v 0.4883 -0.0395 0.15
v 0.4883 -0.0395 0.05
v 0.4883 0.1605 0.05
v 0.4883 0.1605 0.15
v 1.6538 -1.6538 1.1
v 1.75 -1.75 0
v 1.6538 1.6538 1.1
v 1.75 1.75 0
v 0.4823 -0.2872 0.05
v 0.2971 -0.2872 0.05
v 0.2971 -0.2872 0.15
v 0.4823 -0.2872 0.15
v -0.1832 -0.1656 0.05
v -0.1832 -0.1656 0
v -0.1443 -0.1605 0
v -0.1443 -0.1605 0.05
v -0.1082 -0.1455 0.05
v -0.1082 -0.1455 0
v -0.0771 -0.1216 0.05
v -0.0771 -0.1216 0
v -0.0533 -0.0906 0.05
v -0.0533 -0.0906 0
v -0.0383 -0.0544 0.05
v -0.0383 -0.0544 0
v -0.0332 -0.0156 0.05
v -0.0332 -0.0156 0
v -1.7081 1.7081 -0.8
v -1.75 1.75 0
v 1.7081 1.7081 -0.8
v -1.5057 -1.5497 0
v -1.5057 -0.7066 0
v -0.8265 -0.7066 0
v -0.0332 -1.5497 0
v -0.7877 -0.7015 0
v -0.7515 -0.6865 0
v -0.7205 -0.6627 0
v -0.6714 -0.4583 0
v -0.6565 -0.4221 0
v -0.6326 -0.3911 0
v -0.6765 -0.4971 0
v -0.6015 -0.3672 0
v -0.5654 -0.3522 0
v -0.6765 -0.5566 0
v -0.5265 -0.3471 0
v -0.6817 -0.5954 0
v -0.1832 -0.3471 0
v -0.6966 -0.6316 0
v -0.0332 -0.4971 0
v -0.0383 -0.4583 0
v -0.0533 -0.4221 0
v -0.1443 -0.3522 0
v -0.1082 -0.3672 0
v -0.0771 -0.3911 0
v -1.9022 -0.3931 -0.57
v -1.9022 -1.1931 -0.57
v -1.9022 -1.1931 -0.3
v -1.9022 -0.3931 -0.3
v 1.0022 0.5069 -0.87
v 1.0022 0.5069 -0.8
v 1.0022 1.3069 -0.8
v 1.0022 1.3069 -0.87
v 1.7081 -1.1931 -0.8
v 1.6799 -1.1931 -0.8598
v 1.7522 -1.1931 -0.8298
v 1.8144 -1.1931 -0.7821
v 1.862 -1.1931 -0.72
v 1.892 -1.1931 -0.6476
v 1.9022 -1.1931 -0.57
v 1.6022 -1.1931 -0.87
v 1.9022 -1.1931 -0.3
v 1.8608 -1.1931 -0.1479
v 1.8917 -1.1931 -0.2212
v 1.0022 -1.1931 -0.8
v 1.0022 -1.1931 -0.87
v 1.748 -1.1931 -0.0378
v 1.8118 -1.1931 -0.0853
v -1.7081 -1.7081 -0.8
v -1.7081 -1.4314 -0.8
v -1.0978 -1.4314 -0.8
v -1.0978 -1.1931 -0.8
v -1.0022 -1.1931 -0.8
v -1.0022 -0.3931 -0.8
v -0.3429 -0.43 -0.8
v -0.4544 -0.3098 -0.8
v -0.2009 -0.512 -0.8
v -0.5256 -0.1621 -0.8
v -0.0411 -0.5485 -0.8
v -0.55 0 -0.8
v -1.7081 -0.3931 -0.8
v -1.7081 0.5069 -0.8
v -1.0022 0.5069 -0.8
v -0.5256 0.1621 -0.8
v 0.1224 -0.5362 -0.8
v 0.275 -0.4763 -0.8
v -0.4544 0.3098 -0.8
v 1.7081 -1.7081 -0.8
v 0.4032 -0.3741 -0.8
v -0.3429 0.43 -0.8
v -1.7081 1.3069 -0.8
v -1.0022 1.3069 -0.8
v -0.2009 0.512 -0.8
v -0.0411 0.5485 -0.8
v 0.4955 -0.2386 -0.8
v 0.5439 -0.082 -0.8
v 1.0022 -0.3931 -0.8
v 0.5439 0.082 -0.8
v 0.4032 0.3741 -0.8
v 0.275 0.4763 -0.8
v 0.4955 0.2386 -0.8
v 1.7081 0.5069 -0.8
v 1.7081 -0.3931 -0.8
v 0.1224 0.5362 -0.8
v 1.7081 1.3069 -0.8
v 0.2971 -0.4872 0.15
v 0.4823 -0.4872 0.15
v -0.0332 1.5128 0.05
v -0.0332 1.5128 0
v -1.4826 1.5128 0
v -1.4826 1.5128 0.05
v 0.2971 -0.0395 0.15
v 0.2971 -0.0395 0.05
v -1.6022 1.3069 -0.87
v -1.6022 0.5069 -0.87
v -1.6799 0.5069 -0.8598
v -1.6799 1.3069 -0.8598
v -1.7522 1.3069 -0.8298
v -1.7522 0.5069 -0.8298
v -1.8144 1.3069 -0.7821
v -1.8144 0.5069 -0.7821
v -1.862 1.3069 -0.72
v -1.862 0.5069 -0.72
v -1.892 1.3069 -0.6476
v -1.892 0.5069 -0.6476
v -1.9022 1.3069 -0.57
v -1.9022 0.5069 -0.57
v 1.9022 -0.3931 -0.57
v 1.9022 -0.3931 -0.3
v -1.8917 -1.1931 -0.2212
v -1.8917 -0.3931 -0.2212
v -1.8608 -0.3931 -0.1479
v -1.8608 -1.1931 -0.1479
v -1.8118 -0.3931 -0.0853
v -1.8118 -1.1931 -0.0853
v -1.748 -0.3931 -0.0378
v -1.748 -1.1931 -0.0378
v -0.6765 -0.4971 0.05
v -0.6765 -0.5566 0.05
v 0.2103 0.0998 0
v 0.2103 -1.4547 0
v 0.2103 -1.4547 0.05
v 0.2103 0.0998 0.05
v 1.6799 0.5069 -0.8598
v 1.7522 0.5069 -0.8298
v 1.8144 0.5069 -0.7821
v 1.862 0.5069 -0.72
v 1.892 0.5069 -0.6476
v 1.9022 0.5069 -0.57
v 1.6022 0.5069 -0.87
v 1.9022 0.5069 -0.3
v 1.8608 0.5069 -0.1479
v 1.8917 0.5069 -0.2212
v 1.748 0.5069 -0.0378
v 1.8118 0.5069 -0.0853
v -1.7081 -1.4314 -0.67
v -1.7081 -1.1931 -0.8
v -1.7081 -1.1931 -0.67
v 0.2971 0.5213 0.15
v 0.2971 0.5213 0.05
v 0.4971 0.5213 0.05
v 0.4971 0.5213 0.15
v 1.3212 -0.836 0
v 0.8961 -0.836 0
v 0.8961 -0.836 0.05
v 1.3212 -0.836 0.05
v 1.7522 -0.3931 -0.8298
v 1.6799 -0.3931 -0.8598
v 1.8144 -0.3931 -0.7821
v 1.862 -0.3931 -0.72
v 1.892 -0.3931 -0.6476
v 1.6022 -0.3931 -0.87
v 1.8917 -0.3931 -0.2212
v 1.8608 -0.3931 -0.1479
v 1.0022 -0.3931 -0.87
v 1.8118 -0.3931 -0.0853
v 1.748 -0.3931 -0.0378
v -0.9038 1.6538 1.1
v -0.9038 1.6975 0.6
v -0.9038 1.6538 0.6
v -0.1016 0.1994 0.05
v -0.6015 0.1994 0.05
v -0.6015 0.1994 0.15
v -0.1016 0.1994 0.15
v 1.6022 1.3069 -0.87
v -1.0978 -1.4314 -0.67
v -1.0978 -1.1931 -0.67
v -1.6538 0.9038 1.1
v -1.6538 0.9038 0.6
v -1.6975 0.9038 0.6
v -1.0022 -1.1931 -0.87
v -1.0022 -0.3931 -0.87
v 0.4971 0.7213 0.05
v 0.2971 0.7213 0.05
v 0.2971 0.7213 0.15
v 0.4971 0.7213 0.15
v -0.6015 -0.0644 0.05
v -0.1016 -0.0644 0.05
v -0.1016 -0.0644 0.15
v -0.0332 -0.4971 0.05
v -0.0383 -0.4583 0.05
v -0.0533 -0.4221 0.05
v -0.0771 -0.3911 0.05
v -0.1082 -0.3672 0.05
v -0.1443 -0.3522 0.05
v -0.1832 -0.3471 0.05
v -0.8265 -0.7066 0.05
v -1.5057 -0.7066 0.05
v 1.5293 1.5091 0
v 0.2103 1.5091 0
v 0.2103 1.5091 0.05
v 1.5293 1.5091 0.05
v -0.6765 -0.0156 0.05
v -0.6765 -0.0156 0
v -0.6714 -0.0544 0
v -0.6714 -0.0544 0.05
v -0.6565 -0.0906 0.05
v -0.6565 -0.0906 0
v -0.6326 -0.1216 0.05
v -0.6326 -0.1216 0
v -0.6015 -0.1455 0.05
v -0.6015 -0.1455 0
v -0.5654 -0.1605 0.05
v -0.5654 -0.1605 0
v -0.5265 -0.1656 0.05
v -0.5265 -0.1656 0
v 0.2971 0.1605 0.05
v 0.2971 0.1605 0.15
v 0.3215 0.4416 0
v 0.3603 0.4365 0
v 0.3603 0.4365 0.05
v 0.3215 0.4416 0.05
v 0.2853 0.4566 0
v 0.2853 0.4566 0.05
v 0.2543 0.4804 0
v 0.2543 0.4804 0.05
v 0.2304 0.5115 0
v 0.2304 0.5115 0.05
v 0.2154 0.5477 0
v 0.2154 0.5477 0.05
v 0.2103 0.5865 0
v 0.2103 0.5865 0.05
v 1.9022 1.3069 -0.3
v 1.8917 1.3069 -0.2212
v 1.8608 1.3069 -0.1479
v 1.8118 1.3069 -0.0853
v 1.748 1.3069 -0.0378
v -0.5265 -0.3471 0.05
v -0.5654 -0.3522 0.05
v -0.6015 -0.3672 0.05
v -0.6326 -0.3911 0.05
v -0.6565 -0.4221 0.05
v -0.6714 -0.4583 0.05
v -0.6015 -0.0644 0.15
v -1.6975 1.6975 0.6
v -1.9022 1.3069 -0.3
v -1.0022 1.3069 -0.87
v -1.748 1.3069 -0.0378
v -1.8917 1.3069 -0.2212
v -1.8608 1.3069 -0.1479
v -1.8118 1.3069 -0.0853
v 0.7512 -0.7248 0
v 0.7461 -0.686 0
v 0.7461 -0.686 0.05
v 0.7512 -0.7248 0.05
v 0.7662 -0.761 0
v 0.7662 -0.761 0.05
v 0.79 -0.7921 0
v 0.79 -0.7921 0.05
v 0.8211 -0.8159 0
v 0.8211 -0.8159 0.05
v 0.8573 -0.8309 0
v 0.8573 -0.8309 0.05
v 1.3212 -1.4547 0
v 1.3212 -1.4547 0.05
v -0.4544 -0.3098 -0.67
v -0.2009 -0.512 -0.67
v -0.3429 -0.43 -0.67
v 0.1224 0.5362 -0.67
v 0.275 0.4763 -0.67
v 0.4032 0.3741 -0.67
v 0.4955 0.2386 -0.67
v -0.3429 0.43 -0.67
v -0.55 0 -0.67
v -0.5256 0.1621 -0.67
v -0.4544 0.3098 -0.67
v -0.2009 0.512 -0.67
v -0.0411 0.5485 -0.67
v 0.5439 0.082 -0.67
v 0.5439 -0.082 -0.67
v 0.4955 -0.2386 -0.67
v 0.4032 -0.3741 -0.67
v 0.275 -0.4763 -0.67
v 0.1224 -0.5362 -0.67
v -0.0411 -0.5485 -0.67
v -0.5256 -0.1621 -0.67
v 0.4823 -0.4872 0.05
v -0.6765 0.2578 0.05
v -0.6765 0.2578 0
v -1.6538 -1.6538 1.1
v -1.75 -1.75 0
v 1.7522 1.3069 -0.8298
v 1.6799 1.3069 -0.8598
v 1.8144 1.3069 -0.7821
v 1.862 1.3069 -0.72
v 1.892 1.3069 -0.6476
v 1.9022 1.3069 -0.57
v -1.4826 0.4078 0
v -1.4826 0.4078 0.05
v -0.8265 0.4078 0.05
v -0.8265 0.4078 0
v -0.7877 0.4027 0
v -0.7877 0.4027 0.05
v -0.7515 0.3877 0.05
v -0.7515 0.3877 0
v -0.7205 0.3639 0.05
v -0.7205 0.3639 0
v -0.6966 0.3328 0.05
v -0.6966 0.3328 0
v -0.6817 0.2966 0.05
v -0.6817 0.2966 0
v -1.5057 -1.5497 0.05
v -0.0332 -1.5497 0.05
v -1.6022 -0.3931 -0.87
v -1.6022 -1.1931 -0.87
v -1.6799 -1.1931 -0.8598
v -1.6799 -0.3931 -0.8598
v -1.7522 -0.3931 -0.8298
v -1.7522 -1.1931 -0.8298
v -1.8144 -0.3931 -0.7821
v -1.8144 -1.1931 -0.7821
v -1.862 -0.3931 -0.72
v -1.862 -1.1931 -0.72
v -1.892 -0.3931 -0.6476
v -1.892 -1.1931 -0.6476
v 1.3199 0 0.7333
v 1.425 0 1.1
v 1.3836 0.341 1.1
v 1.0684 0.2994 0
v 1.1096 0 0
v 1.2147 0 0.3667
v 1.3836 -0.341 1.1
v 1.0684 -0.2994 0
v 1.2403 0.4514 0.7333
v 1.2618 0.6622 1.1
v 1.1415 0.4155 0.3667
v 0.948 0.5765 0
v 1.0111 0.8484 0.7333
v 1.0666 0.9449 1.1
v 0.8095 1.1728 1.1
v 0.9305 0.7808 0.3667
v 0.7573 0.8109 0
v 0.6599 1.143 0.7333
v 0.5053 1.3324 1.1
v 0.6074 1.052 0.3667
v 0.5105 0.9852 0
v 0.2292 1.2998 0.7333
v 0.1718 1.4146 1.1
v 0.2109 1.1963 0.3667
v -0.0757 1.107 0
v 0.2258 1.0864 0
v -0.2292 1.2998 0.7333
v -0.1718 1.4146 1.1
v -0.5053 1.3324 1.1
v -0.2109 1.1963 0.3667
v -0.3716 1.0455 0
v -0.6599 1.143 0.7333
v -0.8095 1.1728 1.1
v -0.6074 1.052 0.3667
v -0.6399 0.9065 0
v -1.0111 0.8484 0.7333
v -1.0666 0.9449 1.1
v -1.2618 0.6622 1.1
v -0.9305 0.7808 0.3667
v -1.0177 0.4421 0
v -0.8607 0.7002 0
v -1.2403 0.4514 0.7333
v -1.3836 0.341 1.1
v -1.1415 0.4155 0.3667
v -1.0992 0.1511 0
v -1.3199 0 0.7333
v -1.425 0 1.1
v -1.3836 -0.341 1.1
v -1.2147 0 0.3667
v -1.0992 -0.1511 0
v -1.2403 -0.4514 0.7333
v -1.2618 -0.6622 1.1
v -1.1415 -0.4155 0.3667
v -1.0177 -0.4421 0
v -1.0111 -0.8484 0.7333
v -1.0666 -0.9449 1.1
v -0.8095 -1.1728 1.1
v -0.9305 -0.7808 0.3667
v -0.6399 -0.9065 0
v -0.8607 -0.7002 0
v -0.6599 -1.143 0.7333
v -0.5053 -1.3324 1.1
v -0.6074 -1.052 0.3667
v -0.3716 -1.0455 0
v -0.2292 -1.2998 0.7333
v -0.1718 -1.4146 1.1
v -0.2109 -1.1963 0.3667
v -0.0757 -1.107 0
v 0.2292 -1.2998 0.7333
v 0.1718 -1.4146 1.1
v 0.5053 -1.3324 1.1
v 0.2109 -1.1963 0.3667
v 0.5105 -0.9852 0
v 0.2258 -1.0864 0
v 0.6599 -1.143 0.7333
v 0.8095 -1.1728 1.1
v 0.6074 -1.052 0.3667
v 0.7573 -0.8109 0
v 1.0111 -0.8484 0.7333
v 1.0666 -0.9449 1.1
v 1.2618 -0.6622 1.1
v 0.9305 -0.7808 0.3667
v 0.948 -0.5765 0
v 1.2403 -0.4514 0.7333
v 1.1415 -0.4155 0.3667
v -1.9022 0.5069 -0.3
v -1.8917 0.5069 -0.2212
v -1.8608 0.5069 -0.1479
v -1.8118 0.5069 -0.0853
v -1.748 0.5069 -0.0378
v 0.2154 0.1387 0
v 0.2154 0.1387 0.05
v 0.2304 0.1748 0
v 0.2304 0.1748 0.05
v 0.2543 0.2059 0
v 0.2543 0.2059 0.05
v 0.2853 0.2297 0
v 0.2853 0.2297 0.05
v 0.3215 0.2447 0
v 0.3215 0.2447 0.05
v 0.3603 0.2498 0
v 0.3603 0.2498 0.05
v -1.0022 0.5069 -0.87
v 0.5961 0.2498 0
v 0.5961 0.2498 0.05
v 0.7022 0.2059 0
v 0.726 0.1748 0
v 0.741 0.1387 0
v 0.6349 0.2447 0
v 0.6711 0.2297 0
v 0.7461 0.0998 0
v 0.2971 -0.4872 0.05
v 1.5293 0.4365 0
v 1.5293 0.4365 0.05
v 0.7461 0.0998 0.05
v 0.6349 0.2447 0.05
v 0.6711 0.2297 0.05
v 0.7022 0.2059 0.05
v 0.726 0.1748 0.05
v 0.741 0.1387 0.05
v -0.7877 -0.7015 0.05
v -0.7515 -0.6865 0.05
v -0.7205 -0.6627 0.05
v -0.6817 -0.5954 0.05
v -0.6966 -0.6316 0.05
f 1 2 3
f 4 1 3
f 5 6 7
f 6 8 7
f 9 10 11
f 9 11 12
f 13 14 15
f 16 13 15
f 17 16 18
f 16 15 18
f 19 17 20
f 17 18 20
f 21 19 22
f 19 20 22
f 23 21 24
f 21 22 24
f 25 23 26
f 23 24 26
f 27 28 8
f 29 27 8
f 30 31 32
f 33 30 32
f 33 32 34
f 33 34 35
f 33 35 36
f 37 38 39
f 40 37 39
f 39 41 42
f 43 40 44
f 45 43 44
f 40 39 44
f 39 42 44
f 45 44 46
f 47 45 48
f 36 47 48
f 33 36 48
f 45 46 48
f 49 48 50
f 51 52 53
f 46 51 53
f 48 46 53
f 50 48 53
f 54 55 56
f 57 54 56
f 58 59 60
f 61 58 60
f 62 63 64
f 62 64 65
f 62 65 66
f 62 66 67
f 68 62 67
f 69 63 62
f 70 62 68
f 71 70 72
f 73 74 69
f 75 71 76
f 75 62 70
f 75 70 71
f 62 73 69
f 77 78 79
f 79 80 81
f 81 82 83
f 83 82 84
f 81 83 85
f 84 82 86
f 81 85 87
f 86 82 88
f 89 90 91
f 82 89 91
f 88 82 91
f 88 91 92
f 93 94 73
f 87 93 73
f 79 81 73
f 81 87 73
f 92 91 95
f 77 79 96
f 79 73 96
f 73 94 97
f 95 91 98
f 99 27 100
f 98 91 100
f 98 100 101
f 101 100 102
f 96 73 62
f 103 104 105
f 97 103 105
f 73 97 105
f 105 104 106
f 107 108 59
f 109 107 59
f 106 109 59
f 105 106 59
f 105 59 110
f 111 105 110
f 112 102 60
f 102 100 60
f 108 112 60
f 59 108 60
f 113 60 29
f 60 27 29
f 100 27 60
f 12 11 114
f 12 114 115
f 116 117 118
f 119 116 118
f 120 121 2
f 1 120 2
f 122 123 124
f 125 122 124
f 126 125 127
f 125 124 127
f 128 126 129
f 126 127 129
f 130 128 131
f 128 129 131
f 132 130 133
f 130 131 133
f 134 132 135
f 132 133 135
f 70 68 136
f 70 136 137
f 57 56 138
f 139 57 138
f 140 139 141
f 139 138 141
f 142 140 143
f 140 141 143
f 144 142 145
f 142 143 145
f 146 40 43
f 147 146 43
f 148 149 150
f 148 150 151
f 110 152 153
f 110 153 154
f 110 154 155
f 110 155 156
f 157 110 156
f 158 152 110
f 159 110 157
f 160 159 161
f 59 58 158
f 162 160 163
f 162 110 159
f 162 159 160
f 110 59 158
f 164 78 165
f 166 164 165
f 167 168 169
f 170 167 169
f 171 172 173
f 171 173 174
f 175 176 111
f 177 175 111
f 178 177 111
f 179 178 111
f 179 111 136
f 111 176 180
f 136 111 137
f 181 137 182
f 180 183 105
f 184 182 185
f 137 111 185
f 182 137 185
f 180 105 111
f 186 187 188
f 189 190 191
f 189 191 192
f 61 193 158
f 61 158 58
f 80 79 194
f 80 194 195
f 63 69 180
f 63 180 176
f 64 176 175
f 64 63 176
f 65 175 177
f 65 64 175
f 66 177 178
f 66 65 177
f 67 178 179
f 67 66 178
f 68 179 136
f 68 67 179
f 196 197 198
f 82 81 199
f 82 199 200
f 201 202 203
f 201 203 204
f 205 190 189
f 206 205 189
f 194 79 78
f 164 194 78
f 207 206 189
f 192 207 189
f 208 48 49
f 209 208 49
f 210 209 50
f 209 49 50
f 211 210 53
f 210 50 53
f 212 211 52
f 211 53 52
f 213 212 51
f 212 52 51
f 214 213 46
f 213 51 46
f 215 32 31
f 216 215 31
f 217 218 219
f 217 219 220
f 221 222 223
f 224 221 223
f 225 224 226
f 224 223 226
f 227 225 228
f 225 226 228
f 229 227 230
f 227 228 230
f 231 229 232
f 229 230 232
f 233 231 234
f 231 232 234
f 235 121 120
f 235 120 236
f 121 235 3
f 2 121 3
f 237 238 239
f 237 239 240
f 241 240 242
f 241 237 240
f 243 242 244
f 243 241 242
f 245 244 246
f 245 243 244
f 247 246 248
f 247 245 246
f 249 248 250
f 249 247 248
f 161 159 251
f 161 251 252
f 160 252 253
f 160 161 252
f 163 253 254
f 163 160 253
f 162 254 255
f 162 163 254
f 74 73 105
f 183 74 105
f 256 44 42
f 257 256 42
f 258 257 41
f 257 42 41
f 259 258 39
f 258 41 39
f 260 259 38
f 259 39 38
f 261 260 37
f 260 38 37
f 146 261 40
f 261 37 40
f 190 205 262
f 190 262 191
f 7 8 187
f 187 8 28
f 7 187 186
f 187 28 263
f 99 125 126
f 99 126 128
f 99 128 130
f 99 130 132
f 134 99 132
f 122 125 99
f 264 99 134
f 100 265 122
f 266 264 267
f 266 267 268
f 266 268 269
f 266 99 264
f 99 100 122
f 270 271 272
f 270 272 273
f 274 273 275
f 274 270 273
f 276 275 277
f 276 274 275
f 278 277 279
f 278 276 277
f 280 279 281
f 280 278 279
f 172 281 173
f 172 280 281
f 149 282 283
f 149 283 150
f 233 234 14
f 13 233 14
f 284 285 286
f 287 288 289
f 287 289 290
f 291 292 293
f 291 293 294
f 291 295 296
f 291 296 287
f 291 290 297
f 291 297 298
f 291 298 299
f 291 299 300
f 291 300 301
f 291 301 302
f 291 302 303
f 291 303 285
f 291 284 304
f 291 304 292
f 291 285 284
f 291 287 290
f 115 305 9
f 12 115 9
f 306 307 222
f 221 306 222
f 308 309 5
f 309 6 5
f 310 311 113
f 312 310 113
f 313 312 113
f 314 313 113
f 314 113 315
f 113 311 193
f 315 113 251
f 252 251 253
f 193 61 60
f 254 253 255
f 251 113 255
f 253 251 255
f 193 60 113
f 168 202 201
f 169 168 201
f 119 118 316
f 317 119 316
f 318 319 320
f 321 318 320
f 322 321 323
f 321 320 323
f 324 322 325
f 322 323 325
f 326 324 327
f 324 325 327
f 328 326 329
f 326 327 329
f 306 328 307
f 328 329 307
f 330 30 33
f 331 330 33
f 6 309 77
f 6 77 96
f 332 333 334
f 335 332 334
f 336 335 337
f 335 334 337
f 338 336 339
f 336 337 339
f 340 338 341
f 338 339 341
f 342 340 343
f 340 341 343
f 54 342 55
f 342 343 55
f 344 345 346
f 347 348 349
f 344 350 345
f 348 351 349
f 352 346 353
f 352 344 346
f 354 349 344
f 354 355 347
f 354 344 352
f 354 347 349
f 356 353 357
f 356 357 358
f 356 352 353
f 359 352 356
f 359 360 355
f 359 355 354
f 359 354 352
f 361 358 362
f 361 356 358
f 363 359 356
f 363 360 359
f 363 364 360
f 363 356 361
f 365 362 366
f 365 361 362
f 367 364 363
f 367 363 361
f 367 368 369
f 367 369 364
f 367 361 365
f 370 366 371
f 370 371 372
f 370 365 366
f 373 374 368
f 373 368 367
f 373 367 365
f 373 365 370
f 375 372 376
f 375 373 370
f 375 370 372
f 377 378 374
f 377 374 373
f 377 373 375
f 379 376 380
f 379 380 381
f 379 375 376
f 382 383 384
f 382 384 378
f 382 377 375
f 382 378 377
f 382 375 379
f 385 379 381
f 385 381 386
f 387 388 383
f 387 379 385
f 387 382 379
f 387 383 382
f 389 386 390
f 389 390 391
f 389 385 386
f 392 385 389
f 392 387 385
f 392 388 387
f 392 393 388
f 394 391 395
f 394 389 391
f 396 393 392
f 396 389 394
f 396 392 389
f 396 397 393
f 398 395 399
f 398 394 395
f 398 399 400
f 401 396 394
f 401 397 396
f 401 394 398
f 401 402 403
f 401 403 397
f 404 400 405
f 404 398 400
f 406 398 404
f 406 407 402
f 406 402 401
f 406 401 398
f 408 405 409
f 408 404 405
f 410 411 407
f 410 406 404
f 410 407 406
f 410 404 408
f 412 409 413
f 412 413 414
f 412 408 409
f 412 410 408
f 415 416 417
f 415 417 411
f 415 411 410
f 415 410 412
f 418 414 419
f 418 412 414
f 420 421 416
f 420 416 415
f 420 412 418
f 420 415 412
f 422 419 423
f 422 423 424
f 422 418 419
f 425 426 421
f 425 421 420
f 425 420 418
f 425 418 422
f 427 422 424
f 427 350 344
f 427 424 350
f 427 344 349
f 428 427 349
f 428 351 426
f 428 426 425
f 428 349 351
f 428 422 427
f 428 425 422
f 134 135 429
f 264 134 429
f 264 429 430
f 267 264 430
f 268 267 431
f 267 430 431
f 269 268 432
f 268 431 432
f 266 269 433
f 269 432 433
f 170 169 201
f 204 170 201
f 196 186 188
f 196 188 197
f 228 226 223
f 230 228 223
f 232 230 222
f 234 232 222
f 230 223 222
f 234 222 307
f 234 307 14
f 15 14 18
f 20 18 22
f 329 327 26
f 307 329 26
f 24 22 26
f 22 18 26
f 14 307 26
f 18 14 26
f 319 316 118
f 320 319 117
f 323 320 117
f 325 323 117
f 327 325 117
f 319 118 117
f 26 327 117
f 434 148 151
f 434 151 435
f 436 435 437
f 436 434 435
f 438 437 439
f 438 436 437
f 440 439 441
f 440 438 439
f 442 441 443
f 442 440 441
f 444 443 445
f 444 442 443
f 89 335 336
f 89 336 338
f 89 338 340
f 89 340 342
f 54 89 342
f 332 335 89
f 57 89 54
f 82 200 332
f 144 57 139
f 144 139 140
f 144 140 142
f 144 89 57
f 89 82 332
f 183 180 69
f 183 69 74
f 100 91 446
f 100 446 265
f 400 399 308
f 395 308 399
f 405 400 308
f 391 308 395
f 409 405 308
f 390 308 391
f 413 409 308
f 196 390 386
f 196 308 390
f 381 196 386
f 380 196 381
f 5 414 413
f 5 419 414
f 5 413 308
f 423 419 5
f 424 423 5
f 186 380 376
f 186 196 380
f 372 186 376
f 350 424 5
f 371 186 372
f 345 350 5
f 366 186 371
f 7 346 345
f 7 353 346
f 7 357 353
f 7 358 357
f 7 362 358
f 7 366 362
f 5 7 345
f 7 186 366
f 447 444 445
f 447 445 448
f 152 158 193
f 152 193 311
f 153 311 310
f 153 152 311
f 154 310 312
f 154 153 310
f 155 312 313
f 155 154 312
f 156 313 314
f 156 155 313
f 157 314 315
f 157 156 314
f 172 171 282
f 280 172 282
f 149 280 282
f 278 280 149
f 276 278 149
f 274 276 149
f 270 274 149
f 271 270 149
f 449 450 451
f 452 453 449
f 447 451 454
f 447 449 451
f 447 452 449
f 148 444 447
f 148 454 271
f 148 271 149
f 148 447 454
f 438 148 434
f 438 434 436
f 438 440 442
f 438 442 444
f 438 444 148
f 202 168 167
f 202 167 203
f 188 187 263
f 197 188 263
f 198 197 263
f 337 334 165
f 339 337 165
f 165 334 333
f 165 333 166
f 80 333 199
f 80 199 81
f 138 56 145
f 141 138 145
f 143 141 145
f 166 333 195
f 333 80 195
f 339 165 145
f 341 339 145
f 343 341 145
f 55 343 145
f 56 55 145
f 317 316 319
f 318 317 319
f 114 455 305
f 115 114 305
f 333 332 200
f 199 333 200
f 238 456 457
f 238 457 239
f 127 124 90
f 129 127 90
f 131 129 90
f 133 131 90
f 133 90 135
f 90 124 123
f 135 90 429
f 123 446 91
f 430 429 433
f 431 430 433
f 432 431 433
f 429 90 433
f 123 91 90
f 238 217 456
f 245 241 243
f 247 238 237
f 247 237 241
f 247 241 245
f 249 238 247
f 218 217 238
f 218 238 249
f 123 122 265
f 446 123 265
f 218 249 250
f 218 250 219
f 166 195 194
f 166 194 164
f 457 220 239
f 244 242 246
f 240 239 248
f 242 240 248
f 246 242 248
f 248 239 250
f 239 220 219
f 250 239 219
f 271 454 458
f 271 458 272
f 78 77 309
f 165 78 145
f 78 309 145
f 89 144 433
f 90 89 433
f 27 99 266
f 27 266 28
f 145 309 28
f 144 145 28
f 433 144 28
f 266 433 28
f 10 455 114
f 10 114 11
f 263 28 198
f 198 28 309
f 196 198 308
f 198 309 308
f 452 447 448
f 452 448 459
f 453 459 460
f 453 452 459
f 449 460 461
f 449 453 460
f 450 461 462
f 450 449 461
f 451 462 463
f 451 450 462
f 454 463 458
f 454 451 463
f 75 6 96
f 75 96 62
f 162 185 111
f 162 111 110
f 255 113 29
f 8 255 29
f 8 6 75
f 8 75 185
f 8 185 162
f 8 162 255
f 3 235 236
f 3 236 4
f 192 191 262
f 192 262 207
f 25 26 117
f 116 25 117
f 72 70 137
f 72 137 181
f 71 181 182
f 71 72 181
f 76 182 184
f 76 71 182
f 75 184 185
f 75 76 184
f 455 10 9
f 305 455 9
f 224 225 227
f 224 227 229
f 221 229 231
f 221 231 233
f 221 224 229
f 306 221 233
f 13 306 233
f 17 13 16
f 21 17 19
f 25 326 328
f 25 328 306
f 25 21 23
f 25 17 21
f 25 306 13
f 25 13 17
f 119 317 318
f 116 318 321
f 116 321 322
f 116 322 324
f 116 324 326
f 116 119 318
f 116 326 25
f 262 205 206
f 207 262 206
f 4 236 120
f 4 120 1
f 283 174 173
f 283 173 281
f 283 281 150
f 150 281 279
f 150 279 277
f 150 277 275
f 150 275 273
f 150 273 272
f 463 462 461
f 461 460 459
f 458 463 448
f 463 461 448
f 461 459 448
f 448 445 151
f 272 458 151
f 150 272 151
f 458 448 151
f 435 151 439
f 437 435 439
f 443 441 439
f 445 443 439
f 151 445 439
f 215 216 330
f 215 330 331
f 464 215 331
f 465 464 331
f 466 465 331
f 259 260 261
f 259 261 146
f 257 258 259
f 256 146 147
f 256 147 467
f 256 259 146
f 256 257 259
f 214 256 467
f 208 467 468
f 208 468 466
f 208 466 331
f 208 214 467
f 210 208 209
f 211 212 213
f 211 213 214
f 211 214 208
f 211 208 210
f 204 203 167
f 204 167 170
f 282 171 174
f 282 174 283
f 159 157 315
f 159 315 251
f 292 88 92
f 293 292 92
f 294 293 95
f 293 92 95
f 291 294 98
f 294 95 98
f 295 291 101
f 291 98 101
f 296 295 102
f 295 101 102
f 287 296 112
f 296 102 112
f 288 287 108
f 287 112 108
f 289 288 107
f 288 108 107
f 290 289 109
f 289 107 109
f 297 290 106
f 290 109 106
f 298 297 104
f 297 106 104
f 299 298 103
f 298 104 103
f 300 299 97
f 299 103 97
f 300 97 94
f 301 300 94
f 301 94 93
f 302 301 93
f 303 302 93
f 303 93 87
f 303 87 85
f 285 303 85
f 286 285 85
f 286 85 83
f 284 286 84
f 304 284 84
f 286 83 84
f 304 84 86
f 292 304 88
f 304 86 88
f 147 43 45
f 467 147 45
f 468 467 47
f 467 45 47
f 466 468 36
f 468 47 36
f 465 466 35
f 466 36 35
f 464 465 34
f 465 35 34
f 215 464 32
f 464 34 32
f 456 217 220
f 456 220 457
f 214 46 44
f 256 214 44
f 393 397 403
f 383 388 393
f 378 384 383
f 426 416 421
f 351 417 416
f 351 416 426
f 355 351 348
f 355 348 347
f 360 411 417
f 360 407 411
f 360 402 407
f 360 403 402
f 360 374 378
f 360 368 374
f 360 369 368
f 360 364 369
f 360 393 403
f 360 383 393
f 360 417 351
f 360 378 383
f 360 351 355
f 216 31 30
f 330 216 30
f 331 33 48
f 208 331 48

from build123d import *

# Parameters (mm, degrees)
SKETCH_1_W                       = 3.5
SKETCH_1_H                       = 3.5
EXTRUDE_1_DEPTH                  = 0.8
EXTRUDE_1_DRAFT                  = -3
SKETCH_3_R                       = 0.55
SKETCH_3_W                       = 0.705840171
SKETCH_3_H                       = 0.8
SKETCH_3_W_2                     = 0.610307383
CUT_EXTRUDE_1_DEPTH              = 0.13
SKETCH_5_W                       = 0.7
SKETCH_5_H                       = 0.8
SM_BASE_FLANGE_1_DEPTH           = 0.2
SM_EDGE_FLANGE_1_STRIP_W         = 1
SM_EDGE_FLANGE_1_STRIP_H         = 0.2
SM_EDGE_FLANGE_1_STRIP_CUT_DEPTH = 0.8
SM_EDGE_FLANGE_1_DEPTH           = 0.8
SM_EDGE_FLANGE_2_STRIP_W         = 1
SM_EDGE_FLANGE_2_STRIP_H         = 0.2
SM_EDGE_FLANGE_2_STRIP_CUT_DEPTH = 0.8
SM_EDGE_FLANGE_2_DEPTH           = 0.8
PATTERN_LINEAR_1_COUNT           = 2
PATTERN_LINEAR_1_PITCH           = 1.7
SKETCH_30_W                      = 3.5
SKETCH_30_H                      = 3.5
EXTRUDE_3_DEPTH                  = 1.1
EXTRUDE_3_TAPER                  = 5
CUT_EXTRUDE_2_DEPTH              = 0.5
SKETCH_34_R                      = 1.1
CUT_EXTRUDE_3_DEPTH              = 1.1
CHAMFER_1_SIZE                   = 0.325
CHAMFER_1_SIZE_2                 = 1.133409694
EXTRUDE_4_DEPTH                  = 0.05
EXTRUDE_4_2_DEPTH                = 0.05
EXTRUDE_4_3_DEPTH                = 0.05
EXTRUDE_4_4_DEPTH                = 0.05
SKETCH_49_W                      = 0.499821424
SKETCH_49_H                      = 0.263797991
EXTRUDE_5_DEPTH                  = 0.1
SKETCH_49_W_2                    = 0.2
SKETCH_49_H_2                    = 0.2
EXTRUDE_5_2_DEPTH                = 0.1
SKETCH_49_W_3                    = 0.191122393
EXTRUDE_5_3_DEPTH                = 0.1
SKETCH_49_W_4                    = 0.185203988
EXTRUDE_5_4_DEPTH                = 0.1


# Sheet-metal steps are written as plain solids
with BuildPart() as part:
    # Sketch 1 → Бобышка-Вытянуть1 (with draft: the straight prism first)
    with BuildSketch(Plane.XY):
        Rectangle(SKETCH_1_W, SKETCH_1_H)
    extrude(amount=-EXTRUDE_1_DEPTH)
    # Бобышка-Вытянуть1: the draft: its side faces are tilted about the plane it starts from
    extrude_1_sides = [part.faces().sort_by_distance(p)[0] for p in [
        (-1.75, 0, -0.4),
        (0, -1.75, -0.4),
        (1.75, 0, -0.4),
        (0, 1.75, -0.4),
    ]]
    draft(extrude_1_sides, Plane.XY, EXTRUDE_1_DRAFT)

    # Sketch 3 → Вырез-Вытянуть1 (cut)
    with BuildSketch(Plane(origin=(0, 0, -0.8), x_dir=(-1, 0, 0), z_dir=(0, 0, -1))):
        Circle(SKETCH_3_R)
        with Locations((-1.355153691, 0.906864755)):
            Rectangle(SKETCH_3_W, SKETCH_3_H)
        with Locations((1.402920085, 0.906864755)):
            Rectangle(SKETCH_3_W_2, SKETCH_3_H)
        with Locations((-1.355153691, -0.793135245)):
            Rectangle(SKETCH_3_W, SKETCH_3_H)
        with Locations((1.402920085, -1.031434947)):
            Rectangle(SKETCH_3_W_2, SKETCH_3_H)
    extrude(amount=-CUT_EXTRUDE_1_DEPTH, mode=Mode.SUBTRACT)



with BuildPart() as body_2:
    # Sketch 5 → Базовая кромка1 (new body)
    with BuildSketch(Plane(origin=(0, 0, -0.67), x_dir=(-1, 0, 0), z_dir=(0, 0, -1))):
        with Locations((-1.352233606, 0.906864755)):
            Rectangle(SKETCH_5_W, SKETCH_5_H)
    extrude(amount=SM_BASE_FLANGE_1_DEPTH)

    # Ребро-кромка1 strip (across the edge) → Ребро-кромка1 strip cut (cut)
    with BuildSketch(Plane(origin=(1.702233606, 0.506864755, -0.67), x_dir=(-1, 0, 0), z_dir=(0, 1, 0))):
        with Locations((-0.4, -0.1)):
            Rectangle(SM_EDGE_FLANGE_1_STRIP_W, SM_EDGE_FLANGE_1_STRIP_H)
    extrude(amount=SM_EDGE_FLANGE_1_STRIP_CUT_DEPTH, mode=Mode.SUBTRACT)

    # Ребро-кромка1 section (across the edge) → Ребро-кромка1 (add)
    with BuildSketch(Plane(origin=(1.702233606, 0.506864755, -0.67), x_dir=(-1, 0, 0), z_dir=(0, 1, 0))):
        with BuildLine():
            Line((-0.2, 0.1), (-0.2, 0.67))
            Line((-0.2, 0.67), (0, 0.67))
            Line((0, 0.67), (0, 0.1))
            ThreePointArc((0, 0.1), (0.029289322, 0.029289322), (0.1, 0))
            Line((0.1, 0), (0.1, -0.2))
            ThreePointArc((0.1, -0.2), (-0.112132034, -0.112132034), (-0.2, 0.1))
        make_face()
    extrude(amount=SM_EDGE_FLANGE_1_DEPTH)

    # Ребро-кромка2 strip (across the edge) → Ребро-кромка2 strip cut (cut)
    with BuildSketch(Plane(origin=(1.702233606, 0.506864755, 0), x_dir=(0, 0, -1), z_dir=(0, 1, 0))):
        with Locations((-0.2, -0.1)):
            Rectangle(SM_EDGE_FLANGE_2_STRIP_W, SM_EDGE_FLANGE_2_STRIP_H)
    extrude(amount=SM_EDGE_FLANGE_2_STRIP_CUT_DEPTH, mode=Mode.SUBTRACT)

    # Ребро-кромка2 section (across the edge) → Ребро-кромка2 (add)
    with BuildSketch(Plane(origin=(1.702233606, 0.506864755, 0), x_dir=(0, 0, -1), z_dir=(0, 1, 0))):
        with BuildLine():
            Line((0, 0.1), (0, 0.4))
            Line((0, 0.4), (0.2, 0.4))
            Line((0.2, 0.4), (0.2, 0.1))
            ThreePointArc((0.2, 0.1), (0.229289322, 0.029289322), (0.3, 0))
            Line((0.3, 0), (0.3, -0.2))
            ThreePointArc((0.3, -0.2), (0.087867966, -0.112132034), (0, 0.1))
        make_face()
    extrude(amount=SM_EDGE_FLANGE_2_DEPTH)


with BuildPart() as pattern_linear_1_1:
    # Линейный массив1: pattern copy
    add(body_2.part.moved(Location(Vector(0, -1, 0) * (1 * PATTERN_LINEAR_1_PITCH))))


with BuildPart() as body_4:
    # Зеркальное отражение1: mirrored copy
    add(body_2.part.mirror(Plane(origin=(0, 0, 0), x_dir=(0, 0, 1), z_dir=(1, 0, 0))))


with BuildPart() as body_5:
    # Mirror 1 2: mirrored copy
    add(pattern_linear_1_1.part.mirror(Plane(origin=(0, 0, 0), x_dir=(0, 0, 1), z_dir=(1, 0, 0))))


with BuildPart() as part_1:
    add(part.part)

    add(body_2.part)  # Бобышка-Вытянуть3 merges body 2

    add(pattern_linear_1_1.part)  # Бобышка-Вытянуть3 merges Линейный массив1_1

    add(body_4.part)  # Бобышка-Вытянуть3 merges body 4

    add(body_5.part)  # Бобышка-Вытянуть3 merges body 5
    # Эскиз30 → Бобышка-Вытянуть3 (add)
    with BuildSketch(Plane.XY):
        Rectangle(SKETCH_30_W, SKETCH_30_H)
    extrude(amount=EXTRUDE_3_DEPTH, taper=EXTRUDE_3_TAPER)

    # Эскиз33 → Вырез-Вытянуть2 (cut)
    with BuildSketch(Plane.XY.offset(1.1)):
        Polygon((-0.90376247, 1.65376247), (-1.65376247, 0.90376247), (-2.879687624, 0.90376247), (-2.879687624, 2.879687624), (-0.90376247, 2.879687624), align=None)
    extrude(amount=-CUT_EXTRUDE_2_DEPTH, mode=Mode.SUBTRACT)

    # Эскиз34 → Вырез-Вытянуть3 (cut)
    with BuildSketch(Plane.XY.offset(1.1)):
        Circle(SKETCH_34_R)
    extrude(amount=-CUT_EXTRUDE_3_DEPTH, mode=Mode.SUBTRACT)

    # Фаска1
    # the kernel refuses this chamfer: 1.133409694, 0.325 mm, written as the material it takes off along each edge
    with BuildSketch(Plane(origin=(0, 0, 1.1), x_dir=(1, 0, 0), z_dir=(0, -1, 0))) as chamfer_1_piece_1_section:
        Polygon((1.1 + CHAMFER_1_SIZE, 0), (1.1, -CHAMFER_1_SIZE_2), (1.1, 0), align=None)
    chamfer_1_piece_1 = revolve(axis=Axis((0, 0, 1.1), (0, 0, 1)), mode=Mode.PRIVATE)
    chamfer_1_piece_1 = split(chamfer_1_piece_1, bisect_by=Plane(origin=(-1.262154842, 0, 0), z_dir=(0, 0, 1)), keep=Keep.TOP, mode=Mode.PRIVATE)
    add(chamfer_1_piece_1, mode=Mode.SUBTRACT)


with BuildPart() as body_2_2:
    # Эскиз48 → Бобышка-Вытянуть4 (new body)
    with BuildSketch(Plane.XY):
        with BuildLine():
            Line((0.210318716, -1.45465193), (0.210318716, 0.099827842))
            ThreePointArc((0.210318716, 0.099827842), (0.254252699, 0.205893859), (0.360318716, 0.249827842))
            Line((0.360318716, 0.249827842), (0.596091857, 0.249827842))
            ThreePointArc((0.596091857, 0.249827842), (0.702157875, 0.205893859), (0.746091857, 0.099827842))
            Line((0.746091857, 0.099827842), (0.746091857, -0.686015987))
            ThreePointArc((0.746091857, -0.686015987), (0.79002584, -0.792082004), (0.896091857, -0.836015987))
            Line((0.896091857, -0.836015987), (1.321228911, -0.836015987))
            Line((1.321228911, -0.836015987), (1.321228911, -1.45465193))
            Line((1.321228911, -1.45465193), (0.210318716, -1.45465193))
        make_face()
    extrude(amount=EXTRUDE_4_DEPTH)


with BuildPart() as body_3:
    # Эскиз48 → Extrude 4 2 (new body)
    with BuildSketch(Plane.XY):
        with BuildLine():
            Line((0.210318716, 1.509106996), (1.529342803, 1.509106996))
            Line((1.529342803, 1.509106996), (1.529342803, 0.436478181))
            Line((1.529342803, 0.436478181), (0.360318716, 0.436478181))
            ThreePointArc((0.360318716, 0.436478181), (0.254252699, 0.480412163), (0.210318716, 0.586478181))
            Line((0.210318716, 0.586478181), (0.210318716, 1.509106996))
        make_face()
    extrude(amount=EXTRUDE_4_2_DEPTH)


with BuildPart() as body_4_2:
    # Эскиз48 → Extrude 4 3 (new body)
    with BuildSketch(Plane.XY):
        with BuildLine():
            Line((-0.033165046, -1.549652247), (-0.033165046, -0.49711606))
            ThreePointArc((-0.033165046, -0.49711606), (-0.077099029, -0.391050043), (-0.183165046, -0.34711606))
            Line((-0.183165046, -0.34711606), (-0.526546559, -0.34711606))
            ThreePointArc((-0.526546559, -0.34711606), (-0.632612577, -0.391050043), (-0.676546559, -0.49711606))
            Line((-0.676546559, -0.49711606), (-0.676546559, -0.556593928))
            ThreePointArc((-0.676546559, -0.556593928), (-0.720480542, -0.662659945), (-0.826546559, -0.706593928))
            Line((-0.826546559, -0.706593928), (-1.505672411, -0.706593928))
            Line((-1.505672411, -0.706593928), (-1.505672411, -1.549652247))
            Line((-1.505672411, -1.549652247), (-0.033165046, -1.549652247))
        make_face()
    extrude(amount=EXTRUDE_4_3_DEPTH)


with BuildPart() as body_5_2:
    # Эскиз48 → Extrude 4 4 (new body)
    with BuildSketch(Plane.XY):
        with BuildLine():
            Line((-0.033165046, 1.512774786), (-1.482564226, 1.512774786))
            Line((-1.482564226, 1.512774786), (-1.482564226, 0.407787462))
            Line((-1.482564226, 0.407787462), (-0.826546559, 0.407787462))
            ThreePointArc((-0.826546559, 0.407787462), (-0.720480542, 0.363853479), (-0.676546559, 0.257787462))
            Line((-0.676546559, 0.257787462), (-0.676546559, -0.015579737))
            ThreePointArc((-0.676546559, -0.015579737), (-0.632612577, -0.121645754), (-0.526546559, -0.165579737))
            Line((-0.526546559, -0.165579737), (-0.183165046, -0.165579737))
            ThreePointArc((-0.183165046, -0.165579737), (-0.077099029, -0.121645754), (-0.033165046, -0.015579737))
            Line((-0.033165046, -0.015579737), (-0.033165046, 1.512774786))
        make_face()
    extrude(amount=EXTRUDE_4_4_DEPTH)


with BuildPart() as body_6:
    # Эскиз49 → Бобышка-Вытянуть5 (new body)
    with BuildSketch(Plane.XY.offset(0.05)):
        with Locations((-0.351547158, 0.067536346)):
            Rectangle(SKETCH_49_W, SKETCH_49_H)
    extrude(amount=EXTRUDE_5_DEPTH)


with BuildPart() as body_7:
    # Эскиз49 → Extrude 5 2 (new body)
    with BuildSketch(Plane.XY.offset(0.05)):
        with Locations((0.397136578, 0.621269056)):
            Rectangle(SKETCH_49_W_2, SKETCH_49_H_2)
    extrude(amount=EXTRUDE_5_2_DEPTH)


with BuildPart() as body_8:
    # Эскиз49 → Extrude 5 3 (new body)
    with BuildSketch(Plane.XY.offset(0.05)):
        with Locations((0.392697775, 0.060540571)):
            Rectangle(SKETCH_49_W_3, SKETCH_49_H_2)
    extrude(amount=EXTRUDE_5_3_DEPTH)


with BuildPart() as body_9:
    # Эскиз49 → Extrude 5 4 (new body)
    with BuildSketch(Plane.XY.offset(0.05)):
        with Locations((0.389738572, -0.387189749)):
            Rectangle(SKETCH_49_W_4, SKETCH_49_H_2)
    extrude(amount=EXTRUDE_5_4_DEPTH)


solid = Compound([part_1.part, body_2_2.part, body_3.part, body_4_2.part, body_5_2.part, body_6.part, body_7.part, body_8.part, body_9.part])
